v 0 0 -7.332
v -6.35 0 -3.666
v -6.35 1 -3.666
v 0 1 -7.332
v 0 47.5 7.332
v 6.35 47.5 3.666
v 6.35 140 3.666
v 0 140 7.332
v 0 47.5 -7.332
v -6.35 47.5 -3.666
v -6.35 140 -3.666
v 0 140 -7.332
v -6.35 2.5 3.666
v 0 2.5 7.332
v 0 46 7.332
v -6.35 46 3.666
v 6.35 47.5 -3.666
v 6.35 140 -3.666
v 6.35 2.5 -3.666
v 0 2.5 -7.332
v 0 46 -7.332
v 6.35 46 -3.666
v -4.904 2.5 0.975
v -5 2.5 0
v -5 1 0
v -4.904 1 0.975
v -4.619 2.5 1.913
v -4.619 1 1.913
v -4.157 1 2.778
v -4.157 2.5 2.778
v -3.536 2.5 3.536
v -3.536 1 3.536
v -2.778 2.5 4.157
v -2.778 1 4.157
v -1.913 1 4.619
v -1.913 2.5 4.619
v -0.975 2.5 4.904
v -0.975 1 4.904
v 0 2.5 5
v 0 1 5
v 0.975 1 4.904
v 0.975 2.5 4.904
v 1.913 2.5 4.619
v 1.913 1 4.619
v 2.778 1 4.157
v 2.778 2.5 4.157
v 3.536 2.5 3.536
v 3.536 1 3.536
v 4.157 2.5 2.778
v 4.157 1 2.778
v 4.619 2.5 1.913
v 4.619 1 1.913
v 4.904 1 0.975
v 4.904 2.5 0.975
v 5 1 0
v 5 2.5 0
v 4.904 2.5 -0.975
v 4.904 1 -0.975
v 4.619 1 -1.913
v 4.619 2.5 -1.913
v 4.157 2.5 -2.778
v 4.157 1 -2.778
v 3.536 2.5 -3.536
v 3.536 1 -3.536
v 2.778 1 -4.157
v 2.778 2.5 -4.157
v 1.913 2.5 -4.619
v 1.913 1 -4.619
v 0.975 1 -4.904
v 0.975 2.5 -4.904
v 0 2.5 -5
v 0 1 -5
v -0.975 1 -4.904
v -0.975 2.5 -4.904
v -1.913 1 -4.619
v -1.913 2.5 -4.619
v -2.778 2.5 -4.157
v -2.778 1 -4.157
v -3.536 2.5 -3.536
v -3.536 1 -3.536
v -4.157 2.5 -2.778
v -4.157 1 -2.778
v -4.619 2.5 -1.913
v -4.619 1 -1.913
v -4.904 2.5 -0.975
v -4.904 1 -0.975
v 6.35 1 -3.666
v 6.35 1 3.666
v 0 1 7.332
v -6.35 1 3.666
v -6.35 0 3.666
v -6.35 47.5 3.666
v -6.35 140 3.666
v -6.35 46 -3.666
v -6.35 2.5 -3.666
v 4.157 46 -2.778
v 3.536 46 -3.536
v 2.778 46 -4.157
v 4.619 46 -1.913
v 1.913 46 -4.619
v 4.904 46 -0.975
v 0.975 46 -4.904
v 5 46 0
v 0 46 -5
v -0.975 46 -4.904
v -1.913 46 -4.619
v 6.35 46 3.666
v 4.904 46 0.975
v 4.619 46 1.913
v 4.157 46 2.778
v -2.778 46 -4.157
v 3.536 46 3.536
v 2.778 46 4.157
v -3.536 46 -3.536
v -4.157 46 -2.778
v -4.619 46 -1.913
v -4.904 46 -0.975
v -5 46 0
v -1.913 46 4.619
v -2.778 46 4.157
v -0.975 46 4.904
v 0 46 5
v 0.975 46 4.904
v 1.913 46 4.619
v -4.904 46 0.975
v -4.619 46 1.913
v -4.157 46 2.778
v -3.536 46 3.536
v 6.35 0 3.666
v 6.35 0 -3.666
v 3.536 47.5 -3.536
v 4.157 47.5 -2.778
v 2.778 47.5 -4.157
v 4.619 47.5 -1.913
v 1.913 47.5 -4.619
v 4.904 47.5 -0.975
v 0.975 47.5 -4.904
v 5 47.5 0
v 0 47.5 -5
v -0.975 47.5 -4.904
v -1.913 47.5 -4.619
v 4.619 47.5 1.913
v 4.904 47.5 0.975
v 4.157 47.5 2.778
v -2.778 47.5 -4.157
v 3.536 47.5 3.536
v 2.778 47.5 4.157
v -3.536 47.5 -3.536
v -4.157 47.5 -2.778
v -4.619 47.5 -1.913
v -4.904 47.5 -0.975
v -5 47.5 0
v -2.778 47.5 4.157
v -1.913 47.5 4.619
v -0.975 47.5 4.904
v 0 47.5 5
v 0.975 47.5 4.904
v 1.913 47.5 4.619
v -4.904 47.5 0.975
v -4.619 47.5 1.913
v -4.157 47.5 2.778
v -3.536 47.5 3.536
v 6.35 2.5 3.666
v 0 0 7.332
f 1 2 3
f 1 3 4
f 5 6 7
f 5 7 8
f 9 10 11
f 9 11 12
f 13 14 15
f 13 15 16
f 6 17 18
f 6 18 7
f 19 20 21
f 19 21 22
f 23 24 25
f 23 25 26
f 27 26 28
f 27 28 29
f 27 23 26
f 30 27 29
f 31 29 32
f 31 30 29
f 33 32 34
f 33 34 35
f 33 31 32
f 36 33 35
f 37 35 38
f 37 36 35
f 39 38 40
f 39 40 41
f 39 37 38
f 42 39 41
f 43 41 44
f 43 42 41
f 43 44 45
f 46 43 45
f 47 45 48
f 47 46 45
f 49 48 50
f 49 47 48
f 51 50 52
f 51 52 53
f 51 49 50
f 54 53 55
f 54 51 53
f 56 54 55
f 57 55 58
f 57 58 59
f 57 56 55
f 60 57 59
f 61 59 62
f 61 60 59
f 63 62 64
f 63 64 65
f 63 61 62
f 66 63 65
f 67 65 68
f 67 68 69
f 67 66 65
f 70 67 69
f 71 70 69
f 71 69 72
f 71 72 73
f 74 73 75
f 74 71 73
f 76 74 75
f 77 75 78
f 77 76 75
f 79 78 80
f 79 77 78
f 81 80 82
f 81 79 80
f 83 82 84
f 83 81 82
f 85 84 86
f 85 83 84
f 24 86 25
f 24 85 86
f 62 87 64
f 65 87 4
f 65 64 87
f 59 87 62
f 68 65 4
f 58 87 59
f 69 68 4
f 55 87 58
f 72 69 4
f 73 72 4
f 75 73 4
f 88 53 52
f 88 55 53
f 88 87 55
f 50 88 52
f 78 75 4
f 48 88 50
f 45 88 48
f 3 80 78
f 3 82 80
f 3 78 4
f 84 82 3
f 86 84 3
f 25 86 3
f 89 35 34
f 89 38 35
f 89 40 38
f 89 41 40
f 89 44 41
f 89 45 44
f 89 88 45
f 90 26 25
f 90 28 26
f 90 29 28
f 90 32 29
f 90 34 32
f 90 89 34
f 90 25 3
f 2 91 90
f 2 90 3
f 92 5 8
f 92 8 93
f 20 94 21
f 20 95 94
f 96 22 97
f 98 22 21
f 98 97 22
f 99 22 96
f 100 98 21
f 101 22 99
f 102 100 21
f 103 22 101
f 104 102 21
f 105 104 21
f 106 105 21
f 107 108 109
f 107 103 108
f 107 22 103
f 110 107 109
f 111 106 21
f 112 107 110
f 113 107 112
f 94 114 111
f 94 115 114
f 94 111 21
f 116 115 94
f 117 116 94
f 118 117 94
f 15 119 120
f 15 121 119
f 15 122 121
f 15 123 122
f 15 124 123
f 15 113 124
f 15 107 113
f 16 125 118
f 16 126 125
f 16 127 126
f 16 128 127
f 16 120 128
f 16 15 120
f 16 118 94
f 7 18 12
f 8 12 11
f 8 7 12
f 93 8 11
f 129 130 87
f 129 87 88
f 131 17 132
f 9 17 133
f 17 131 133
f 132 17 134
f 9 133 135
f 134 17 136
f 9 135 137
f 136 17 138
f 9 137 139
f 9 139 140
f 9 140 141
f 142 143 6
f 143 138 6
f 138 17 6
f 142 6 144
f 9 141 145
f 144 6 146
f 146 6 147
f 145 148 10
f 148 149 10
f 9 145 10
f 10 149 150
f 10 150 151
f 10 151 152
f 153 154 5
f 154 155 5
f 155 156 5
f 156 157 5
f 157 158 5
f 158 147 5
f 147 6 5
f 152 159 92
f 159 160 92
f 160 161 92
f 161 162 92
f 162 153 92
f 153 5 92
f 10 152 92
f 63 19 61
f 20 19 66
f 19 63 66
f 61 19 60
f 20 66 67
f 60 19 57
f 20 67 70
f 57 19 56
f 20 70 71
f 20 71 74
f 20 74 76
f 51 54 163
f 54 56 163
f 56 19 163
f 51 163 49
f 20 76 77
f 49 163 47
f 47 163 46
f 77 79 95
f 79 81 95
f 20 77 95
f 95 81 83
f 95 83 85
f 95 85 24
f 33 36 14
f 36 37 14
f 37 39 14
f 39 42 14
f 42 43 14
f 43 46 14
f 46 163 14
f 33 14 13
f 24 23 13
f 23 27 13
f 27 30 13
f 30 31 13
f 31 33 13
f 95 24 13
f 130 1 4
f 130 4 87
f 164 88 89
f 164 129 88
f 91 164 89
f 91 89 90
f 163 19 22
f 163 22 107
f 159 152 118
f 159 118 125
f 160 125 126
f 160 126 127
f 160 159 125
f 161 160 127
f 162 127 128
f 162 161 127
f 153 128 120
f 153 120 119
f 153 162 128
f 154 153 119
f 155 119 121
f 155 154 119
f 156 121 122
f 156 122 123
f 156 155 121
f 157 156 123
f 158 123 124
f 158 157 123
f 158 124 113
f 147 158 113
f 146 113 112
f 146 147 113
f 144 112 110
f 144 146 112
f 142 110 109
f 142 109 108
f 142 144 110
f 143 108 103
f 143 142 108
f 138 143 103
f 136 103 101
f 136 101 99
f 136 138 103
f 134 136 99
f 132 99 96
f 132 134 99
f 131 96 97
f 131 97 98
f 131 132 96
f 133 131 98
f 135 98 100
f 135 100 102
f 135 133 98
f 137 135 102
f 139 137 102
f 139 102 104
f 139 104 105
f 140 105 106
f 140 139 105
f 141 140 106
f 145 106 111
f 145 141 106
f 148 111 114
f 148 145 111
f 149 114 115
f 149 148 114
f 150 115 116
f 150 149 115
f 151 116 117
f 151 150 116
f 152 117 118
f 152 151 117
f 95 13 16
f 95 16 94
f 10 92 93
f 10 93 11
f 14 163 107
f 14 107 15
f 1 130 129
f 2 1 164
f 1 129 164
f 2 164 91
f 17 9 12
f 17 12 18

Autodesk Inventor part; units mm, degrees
ref_plane "YZ Plane" through (0, 0, 0) normal (1, 0, 0) x (0, 1, 0)
ref_plane "XZ Plane" through (0, 0, 0) normal (0, 1, 0) x (-1, 0, 0)
ref_plane "XY Plane" through (0, 0, 0) normal (0, 0, 1) x (1, 0, 0)
sketch "Sketch1" plane through (0, 0, 0) normal (0, 1, 0) x (-1, 0, 0)
  line L0 (6.35, 3.6662) -> (6.35, -3.6662)
  line L1 (6.35, -3.6662) -> (0, -7.3323)
  line L2 (0, -7.3323) -> (-6.35, -3.6662)
  line L3 (-6.35, -3.6662) -> (-6.35, 3.6662)
  line L4 (-6.35, 3.6662) -> (0, 7.3323)
  line L5 (0, 7.3323) -> (6.35, 3.6662)
  point P0 (0, 0)
  point P1 (0, 0)
  dimension "d0" = 12.7
extrude "Extrusion1" add sketch "Sketch1" along normal blind 140
sketch "Sketch2" plane through (0, 0, 0) normal (0, 0, 1) x (1, 0, 0)
  line L0 (-15, 1) -> (-5, 1)
  line L1 (-5, 1) -> (-5, 2.5)
  line L2 (-5, 2.5) -> (-15, 2.5)
  line L3 (-15, 2.5) -> (-15, 1)
  line L4 (0, 0) -> (0, 140) projected
  line L5 (0, 0) -> (6.35, 0) projected
  line L6 (0, -26) -> (0, 156) projected
  line L7 (-15, 46) -> (-5, 46)
  line L8 (-5, 46) -> (-5, 47.5)
  line L9 (-5, 47.5) -> (-15, 47.5)
  line L10 (-15, 47.5) -> (-15, 46)
  point P0 (-15, 46.75)
  dimension "d3" = 1.5
  dimension "d4" = 10
  dimension "d5" = 5
  dimension "d6" = 1
  dimension "d8" = 43.5
revolve "Revolution1" cut sketch "Sketch2" angle 360 about axis through (0, -10, 0) along (0, 1, 0)
properties part number "Wasp Pivot Axle"
